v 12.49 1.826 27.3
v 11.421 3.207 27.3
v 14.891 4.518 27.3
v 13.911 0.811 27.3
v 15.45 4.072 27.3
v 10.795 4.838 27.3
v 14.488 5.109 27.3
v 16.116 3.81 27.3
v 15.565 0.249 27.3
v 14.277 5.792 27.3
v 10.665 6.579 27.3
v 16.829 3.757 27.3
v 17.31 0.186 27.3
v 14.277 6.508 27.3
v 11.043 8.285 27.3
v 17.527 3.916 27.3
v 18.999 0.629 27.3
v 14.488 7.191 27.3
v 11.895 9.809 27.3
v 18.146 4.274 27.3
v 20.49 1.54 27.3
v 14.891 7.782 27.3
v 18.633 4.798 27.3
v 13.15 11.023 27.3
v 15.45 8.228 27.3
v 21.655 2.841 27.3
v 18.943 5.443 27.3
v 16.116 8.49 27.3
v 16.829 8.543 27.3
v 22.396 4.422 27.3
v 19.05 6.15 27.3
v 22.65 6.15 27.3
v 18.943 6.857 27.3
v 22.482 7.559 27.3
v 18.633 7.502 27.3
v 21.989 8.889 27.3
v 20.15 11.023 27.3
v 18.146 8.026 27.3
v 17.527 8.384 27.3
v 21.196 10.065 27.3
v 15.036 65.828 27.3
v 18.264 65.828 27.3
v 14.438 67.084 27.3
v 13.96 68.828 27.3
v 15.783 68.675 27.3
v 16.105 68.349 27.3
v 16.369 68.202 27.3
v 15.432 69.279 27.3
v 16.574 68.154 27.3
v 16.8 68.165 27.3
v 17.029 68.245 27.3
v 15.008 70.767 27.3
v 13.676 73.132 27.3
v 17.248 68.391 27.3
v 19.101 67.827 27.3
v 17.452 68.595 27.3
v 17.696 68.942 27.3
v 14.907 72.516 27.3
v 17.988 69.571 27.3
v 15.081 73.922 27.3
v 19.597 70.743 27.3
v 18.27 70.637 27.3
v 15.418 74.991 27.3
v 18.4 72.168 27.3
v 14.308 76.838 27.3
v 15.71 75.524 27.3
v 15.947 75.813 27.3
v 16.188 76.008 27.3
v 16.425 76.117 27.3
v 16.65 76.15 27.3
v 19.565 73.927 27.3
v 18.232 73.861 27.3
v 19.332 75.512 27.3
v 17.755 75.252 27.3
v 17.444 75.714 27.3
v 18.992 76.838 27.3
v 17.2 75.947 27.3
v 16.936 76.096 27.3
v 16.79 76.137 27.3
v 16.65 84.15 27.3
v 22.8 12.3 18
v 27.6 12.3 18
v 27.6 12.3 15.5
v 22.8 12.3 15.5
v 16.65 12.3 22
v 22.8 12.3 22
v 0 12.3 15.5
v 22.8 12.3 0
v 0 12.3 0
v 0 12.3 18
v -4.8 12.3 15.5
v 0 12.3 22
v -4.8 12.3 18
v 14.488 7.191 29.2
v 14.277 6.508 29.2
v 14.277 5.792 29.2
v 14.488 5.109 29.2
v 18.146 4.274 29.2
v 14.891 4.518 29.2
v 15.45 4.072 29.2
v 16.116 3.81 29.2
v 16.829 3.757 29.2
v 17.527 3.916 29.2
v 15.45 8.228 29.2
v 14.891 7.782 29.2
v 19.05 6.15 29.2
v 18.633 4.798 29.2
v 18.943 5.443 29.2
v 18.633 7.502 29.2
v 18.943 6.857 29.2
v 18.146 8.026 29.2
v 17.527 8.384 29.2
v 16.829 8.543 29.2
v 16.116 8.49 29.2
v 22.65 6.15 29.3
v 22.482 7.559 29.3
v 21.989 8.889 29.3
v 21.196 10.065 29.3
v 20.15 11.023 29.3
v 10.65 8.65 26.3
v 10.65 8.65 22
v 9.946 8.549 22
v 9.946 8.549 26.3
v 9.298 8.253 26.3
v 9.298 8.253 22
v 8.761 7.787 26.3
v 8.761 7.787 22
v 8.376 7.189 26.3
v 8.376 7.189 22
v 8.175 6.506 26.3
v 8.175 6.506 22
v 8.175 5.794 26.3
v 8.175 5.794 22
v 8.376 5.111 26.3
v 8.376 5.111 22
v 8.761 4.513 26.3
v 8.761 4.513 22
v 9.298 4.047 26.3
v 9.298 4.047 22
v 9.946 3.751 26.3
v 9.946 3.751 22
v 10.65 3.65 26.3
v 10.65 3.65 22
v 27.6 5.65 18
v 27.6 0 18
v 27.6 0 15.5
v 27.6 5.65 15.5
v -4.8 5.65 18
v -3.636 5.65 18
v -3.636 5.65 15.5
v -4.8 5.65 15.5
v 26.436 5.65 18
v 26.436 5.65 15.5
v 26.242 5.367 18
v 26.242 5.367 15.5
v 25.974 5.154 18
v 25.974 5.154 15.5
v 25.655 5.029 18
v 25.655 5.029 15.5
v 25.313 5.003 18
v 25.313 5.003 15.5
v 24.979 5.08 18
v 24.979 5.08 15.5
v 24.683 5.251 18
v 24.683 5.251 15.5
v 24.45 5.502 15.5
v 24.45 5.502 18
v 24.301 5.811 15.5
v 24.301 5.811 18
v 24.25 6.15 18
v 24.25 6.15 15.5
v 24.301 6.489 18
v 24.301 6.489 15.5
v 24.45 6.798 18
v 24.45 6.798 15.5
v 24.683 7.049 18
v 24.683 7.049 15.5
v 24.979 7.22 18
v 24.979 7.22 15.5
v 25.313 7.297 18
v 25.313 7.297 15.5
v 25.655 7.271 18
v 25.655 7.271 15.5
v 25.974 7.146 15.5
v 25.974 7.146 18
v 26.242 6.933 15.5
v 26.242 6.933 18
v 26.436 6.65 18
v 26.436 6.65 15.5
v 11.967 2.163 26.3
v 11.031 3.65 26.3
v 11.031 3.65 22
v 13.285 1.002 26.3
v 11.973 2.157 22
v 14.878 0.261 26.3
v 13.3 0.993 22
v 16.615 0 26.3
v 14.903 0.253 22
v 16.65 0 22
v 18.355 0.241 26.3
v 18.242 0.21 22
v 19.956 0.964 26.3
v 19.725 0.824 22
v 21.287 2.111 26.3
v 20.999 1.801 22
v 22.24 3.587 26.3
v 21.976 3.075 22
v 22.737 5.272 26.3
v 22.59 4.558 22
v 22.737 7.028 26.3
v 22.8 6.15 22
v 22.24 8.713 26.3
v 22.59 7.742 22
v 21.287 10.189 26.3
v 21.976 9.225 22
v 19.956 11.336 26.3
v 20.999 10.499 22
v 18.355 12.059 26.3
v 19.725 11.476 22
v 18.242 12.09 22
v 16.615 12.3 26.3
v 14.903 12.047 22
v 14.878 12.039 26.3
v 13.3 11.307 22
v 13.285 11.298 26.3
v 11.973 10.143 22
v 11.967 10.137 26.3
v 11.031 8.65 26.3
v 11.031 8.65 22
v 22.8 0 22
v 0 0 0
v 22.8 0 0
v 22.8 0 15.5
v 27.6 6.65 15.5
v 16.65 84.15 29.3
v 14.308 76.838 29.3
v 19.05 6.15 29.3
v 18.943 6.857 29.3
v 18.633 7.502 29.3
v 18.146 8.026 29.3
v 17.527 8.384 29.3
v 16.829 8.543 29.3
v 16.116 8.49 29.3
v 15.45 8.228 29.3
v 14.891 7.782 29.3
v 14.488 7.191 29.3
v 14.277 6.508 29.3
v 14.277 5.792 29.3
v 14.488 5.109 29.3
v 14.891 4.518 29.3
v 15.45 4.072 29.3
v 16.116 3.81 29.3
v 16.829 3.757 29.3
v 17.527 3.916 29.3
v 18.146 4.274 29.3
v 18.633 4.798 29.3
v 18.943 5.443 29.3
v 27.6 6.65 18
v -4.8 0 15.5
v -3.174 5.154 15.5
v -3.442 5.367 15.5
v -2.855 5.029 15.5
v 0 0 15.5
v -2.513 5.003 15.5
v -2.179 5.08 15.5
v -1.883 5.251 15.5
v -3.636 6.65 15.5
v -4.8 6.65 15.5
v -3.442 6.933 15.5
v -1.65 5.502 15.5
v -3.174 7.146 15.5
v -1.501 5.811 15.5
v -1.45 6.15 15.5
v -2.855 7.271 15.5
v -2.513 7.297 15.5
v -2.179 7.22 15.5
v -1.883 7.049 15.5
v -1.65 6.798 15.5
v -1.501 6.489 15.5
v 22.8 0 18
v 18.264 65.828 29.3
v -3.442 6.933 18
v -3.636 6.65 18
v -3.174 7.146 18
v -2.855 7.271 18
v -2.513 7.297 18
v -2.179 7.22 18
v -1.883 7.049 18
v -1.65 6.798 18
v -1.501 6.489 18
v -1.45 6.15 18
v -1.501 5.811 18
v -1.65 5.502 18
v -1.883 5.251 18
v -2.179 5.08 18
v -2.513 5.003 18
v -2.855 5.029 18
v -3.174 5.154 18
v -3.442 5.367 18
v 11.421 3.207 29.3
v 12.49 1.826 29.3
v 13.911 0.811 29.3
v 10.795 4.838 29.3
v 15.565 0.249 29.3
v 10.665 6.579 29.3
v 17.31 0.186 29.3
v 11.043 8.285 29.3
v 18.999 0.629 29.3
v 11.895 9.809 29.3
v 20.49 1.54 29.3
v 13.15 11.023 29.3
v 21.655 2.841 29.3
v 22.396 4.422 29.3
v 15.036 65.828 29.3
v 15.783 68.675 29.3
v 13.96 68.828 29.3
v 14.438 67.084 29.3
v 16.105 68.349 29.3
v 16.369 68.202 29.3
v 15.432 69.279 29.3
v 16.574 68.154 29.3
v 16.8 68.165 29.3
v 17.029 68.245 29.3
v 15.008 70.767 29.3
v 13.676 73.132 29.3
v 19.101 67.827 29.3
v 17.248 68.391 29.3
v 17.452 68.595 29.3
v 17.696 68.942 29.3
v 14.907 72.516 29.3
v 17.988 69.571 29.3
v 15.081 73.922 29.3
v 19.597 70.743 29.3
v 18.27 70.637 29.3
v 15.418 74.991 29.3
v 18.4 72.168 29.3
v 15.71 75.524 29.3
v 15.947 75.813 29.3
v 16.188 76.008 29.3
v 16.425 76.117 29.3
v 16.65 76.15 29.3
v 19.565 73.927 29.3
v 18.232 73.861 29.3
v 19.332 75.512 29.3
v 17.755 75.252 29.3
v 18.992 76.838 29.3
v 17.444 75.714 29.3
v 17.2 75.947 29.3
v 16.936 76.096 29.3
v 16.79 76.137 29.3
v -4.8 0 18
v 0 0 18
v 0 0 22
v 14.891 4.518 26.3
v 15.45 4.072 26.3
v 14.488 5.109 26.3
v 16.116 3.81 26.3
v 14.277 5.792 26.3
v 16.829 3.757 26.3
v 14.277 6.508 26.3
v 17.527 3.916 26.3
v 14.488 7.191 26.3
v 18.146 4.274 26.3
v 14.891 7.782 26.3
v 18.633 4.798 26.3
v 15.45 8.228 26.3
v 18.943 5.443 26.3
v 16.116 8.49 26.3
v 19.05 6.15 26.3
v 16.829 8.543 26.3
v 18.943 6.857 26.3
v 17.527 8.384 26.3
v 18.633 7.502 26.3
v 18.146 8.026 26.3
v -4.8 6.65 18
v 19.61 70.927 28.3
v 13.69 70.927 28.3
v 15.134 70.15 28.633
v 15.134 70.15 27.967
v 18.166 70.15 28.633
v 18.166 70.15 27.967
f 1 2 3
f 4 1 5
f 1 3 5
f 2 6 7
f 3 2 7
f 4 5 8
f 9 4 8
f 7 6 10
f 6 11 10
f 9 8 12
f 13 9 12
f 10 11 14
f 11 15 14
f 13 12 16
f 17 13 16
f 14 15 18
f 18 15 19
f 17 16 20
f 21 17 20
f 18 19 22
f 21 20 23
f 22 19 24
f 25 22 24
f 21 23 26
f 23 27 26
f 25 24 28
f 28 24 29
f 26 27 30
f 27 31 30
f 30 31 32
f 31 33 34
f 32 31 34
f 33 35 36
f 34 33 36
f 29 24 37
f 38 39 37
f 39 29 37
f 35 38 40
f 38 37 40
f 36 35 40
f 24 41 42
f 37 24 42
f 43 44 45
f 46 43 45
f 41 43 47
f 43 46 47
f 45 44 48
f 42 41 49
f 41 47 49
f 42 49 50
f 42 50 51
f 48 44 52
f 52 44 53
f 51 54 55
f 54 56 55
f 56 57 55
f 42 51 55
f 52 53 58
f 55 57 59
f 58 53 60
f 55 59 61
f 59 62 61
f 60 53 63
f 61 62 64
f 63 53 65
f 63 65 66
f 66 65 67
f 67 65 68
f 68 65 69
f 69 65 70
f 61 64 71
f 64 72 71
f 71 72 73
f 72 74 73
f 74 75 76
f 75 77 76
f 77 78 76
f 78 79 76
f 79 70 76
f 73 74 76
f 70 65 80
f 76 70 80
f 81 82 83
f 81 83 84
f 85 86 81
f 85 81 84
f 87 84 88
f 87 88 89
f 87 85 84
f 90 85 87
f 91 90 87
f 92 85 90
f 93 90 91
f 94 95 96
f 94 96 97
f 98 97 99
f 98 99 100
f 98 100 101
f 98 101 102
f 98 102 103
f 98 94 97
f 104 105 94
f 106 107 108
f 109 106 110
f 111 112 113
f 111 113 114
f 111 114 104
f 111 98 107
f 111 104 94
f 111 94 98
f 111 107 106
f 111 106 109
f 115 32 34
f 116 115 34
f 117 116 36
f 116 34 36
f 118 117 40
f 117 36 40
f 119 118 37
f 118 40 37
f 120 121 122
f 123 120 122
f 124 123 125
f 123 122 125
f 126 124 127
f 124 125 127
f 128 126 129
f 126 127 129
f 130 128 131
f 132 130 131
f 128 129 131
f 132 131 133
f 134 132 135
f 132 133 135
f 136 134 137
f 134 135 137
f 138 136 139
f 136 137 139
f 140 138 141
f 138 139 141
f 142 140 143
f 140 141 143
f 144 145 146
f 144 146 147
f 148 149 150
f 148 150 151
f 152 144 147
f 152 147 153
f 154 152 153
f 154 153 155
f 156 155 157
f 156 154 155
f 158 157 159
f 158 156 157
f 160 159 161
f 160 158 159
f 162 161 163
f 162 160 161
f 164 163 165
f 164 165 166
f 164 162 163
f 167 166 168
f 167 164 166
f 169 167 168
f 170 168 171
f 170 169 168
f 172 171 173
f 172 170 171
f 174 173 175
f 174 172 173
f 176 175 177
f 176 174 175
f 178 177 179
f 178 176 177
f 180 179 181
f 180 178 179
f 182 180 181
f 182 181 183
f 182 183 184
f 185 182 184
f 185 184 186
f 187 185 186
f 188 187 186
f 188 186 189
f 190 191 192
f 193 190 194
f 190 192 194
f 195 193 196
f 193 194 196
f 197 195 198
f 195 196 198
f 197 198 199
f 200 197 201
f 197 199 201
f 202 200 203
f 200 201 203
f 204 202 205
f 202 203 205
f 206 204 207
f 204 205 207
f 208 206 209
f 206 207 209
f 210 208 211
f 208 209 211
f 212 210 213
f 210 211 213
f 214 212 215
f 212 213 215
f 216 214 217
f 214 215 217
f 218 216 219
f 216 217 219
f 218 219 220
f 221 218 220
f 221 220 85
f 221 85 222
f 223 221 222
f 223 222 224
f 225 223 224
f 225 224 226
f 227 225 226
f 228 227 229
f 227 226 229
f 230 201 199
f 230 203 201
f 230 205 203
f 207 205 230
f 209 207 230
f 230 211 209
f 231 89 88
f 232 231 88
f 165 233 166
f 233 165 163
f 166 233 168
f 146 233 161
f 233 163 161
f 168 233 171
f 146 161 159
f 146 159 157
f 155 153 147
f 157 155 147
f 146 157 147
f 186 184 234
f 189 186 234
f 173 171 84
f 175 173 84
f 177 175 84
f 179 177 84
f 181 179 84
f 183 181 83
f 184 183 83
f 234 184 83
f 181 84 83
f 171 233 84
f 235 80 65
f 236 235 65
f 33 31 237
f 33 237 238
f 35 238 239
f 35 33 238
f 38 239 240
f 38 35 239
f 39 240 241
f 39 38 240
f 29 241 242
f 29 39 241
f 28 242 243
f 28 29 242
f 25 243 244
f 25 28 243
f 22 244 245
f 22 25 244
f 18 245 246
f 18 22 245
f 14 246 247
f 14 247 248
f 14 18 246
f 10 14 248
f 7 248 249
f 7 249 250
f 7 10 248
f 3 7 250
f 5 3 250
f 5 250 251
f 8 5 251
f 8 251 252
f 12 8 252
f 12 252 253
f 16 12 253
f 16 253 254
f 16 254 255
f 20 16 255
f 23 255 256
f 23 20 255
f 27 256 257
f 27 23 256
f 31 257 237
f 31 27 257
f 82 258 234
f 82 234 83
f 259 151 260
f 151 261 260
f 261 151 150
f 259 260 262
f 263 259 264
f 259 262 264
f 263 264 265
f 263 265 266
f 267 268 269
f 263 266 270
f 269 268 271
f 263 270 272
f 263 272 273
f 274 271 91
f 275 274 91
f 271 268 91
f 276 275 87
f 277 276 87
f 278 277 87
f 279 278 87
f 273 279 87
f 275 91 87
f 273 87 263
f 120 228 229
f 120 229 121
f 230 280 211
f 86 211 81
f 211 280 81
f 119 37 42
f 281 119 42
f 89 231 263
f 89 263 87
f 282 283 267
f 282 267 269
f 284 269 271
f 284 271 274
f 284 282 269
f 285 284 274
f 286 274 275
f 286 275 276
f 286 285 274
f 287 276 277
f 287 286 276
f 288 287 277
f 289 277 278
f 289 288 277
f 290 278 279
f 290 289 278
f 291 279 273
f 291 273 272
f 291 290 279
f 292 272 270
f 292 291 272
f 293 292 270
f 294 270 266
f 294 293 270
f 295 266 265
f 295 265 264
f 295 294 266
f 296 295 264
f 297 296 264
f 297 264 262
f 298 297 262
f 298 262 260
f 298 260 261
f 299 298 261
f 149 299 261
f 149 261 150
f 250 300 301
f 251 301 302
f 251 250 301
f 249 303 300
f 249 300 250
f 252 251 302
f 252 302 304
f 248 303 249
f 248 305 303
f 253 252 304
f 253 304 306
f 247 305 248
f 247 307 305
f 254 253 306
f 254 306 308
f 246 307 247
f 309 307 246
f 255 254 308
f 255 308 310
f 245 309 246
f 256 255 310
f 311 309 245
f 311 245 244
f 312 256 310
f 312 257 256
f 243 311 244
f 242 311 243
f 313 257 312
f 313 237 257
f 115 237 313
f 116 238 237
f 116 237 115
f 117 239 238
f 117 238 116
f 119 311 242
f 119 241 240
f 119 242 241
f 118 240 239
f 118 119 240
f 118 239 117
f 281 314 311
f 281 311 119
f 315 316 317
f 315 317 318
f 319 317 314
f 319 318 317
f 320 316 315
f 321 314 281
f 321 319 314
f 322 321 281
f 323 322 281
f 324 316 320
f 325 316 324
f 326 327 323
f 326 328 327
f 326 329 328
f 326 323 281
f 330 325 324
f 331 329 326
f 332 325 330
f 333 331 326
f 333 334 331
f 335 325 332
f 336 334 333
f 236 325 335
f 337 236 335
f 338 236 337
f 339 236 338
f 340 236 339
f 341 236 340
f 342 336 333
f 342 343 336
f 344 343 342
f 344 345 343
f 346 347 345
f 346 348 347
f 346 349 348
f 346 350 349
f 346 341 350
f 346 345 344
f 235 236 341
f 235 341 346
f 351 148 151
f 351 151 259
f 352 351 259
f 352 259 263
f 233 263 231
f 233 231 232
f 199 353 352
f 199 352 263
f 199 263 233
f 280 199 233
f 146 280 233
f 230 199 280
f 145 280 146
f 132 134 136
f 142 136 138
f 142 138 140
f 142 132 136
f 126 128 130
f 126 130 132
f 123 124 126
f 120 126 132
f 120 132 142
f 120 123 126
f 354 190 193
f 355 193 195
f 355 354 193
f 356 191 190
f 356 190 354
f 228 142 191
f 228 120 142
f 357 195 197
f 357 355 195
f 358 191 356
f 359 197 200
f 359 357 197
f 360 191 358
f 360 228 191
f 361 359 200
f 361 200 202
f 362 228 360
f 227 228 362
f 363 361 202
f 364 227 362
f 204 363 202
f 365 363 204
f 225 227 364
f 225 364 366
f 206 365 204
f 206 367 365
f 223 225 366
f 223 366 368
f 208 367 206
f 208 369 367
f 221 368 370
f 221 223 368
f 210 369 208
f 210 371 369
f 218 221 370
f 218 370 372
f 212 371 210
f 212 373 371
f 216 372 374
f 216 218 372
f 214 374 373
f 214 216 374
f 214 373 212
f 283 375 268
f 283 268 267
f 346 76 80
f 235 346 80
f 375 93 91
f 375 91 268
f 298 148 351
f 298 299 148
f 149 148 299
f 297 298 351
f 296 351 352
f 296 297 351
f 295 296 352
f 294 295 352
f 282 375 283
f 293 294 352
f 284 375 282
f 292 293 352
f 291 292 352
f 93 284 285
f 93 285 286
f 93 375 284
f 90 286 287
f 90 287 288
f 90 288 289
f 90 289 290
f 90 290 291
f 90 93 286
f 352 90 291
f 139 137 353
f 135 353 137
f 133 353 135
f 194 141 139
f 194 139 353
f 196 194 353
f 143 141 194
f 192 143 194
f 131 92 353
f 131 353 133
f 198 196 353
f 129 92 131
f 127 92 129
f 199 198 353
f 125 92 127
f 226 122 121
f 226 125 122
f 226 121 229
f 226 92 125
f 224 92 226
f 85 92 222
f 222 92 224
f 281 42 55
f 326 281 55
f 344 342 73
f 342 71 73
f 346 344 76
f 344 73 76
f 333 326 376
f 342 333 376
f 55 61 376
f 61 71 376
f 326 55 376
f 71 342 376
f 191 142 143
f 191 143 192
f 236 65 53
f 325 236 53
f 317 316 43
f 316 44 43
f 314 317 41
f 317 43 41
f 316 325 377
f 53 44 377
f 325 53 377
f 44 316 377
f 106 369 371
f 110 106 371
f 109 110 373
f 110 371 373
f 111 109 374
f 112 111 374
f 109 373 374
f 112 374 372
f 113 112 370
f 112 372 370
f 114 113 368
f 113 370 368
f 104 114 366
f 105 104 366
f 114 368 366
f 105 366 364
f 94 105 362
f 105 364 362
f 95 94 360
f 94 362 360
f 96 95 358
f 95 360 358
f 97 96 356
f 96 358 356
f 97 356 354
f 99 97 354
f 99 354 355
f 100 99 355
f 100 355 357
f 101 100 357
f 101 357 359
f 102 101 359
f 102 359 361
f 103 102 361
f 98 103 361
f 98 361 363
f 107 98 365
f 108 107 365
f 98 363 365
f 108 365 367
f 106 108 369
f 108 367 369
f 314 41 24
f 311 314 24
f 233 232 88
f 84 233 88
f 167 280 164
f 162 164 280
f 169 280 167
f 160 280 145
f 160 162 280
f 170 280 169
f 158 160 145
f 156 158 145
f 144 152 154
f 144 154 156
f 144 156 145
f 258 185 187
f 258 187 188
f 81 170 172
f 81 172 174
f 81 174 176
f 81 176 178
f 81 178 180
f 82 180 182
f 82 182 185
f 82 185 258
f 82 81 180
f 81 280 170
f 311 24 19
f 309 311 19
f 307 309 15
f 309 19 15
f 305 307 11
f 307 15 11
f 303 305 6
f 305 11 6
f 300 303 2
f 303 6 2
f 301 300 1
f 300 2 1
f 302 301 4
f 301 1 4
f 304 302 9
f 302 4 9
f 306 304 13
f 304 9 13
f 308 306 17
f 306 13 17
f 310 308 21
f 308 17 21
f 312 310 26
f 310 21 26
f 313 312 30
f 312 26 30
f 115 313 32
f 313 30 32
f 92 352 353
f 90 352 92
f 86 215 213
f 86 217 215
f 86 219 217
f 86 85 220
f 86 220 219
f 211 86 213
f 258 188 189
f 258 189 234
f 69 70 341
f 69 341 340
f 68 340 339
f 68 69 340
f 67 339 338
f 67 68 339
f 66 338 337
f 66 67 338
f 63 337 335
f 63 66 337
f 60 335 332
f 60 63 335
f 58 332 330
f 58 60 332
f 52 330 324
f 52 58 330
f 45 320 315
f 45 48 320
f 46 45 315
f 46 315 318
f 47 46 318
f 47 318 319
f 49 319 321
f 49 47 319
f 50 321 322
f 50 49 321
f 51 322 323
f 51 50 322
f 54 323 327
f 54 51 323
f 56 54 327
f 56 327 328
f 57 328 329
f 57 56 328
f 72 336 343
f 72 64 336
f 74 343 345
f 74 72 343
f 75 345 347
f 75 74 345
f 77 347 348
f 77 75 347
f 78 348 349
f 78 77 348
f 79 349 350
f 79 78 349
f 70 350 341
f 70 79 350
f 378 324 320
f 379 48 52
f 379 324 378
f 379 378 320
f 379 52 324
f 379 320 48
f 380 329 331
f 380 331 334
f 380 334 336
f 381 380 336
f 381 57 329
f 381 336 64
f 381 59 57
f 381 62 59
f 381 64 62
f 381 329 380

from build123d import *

# Parameters (mm, degrees)
F0_W      = 22.8
F0_H      = 12.3
F1_DEPTH  = 18
F3_DEPTH  = 2.5
F4_W      = 22.8
F4_H      = 12.3
F5_DEPTH  = 4
F7_DEPTH  = 4.3
F8_R      = 2.4
F9_DEPTH  = 2.9
F11_R     = 2.4
F12_DEPTH = 2


with BuildPart() as f1:
    # F0 (on Top) → F1 (new body)
    with BuildSketch(Plane.XY):
        with Locations((11.4, 6.15)):
            Rectangle(F0_W, F0_H)
    extrude(amount=F1_DEPTH)

    # F2 (on face) → F3 (join)
    with BuildSketch(Plane.XY.offset(18)):
        with BuildLine():
            Line((22.8, 12.3), (0, 12.3))
            Line((0, 12.3), (-4.8, 12.3))
            Line((-4.8, 12.3), (-4.8, 6.65))
            Line((-4.8, 6.65), (-3.6356157589, 6.65))
            ThreePointArc((-3.6356157589, 6.65), (-1.45, 6.15), (-3.6356157589, 5.65))
            Line((-3.6356157589, 5.65), (-4.8, 5.65))
            Line((-4.8, 5.65), (-4.8, 0))
            Line((-4.8, 0), (0, 0))
            Line((0, 0), (22.8, 0))
            Line((22.8, 0), (27.6, 0))
            Line((27.6, 0), (27.6, 5.65))
            Line((27.6, 5.65), (26.4356157589, 5.65))
            ThreePointArc((26.4356157589, 5.65), (24.25, 6.15), (26.4356157589, 6.65))
            Line((26.4356157589, 6.65), (27.6, 6.65))
            Line((27.6, 6.65), (27.6, 12.3))
            Line((27.6, 12.3), (22.8, 12.3))
        make_face()
    extrude(amount=-F3_DEPTH)

    # F4 (on face) → F5 (join)
    with BuildSketch(Plane.XY.offset(18)):
        with Locations((11.4, 6.15)):
            Rectangle(F4_W, F4_H)
    extrude(amount=F5_DEPTH)

    # F6 (on face) → F7 (join)
    with BuildSketch(Plane.XY.offset(22)):
        with BuildLine():
            Line((10.65, 3.65), (11.0310588186, 3.65))
            ThreePointArc((11.0310588186, 3.65), (22.8, 6.15), (11.0310588186, 8.65))
            Line((11.0310588186, 8.65), (10.65, 8.65))
            ThreePointArc((10.65, 8.65), (8.15, 6.15), (10.65, 3.65))
        make_face()
    extrude(amount=F7_DEPTH)

    # F8 (on face) → F9 (join)
    with BuildSketch(Plane.XY.offset(26.3)):
        with Locations((16.65, 6.15)):
            Circle(F8_R)
    extrude(amount=F9_DEPTH)


with BuildPart() as f12:
    # F11 (on offset) → F12 (new body)
    with BuildSketch(Plane.XY.offset(27.3)):
        with BuildLine():
            ThreePointArc((13.15, 11.0233971724), (13.9113872125, 0.811460874), (22.65, 6.15))
            ThreePointArc((22.65, 6.15), (21.988539126, 8.8886127875), (20.15, 11.0233971724))
            ThreePointArc((20.15, 11.0233971724), (16.65, 12.15), (13.15, 11.0233971724))
        make_face()
        with Locations((16.65, 6.15)):
            Circle(F11_R, mode=Mode.SUBTRACT)
        with BuildLine():
            ThreePointArc((13.15, 11.0233971724), (16.65, 12.15), (20.15, 11.0233971724))
            Line((20.15, 11.0233971724), (18.264289308, 65.8283753918))
            add(Edge.make_bspline(
                [(18.264289308, 65.8283753918), (21.0789576918, 70.3205840399), (18.9918742494, 76.8375)],
                knots=[0.5681770814, 0.5681770814, 0.5681770814, 2.2459278597, 2.2459278597, 2.2459278597], degree=2, weights=[1, 0.6682998373, 1]))
            Line((18.9918742494, 76.8375), (16.65, 84.15))
            Line((16.65, 84.15), (14.3081257506, 76.8375))
            add(Edge.make_bspline(
                [(14.3081257506, 76.8375), (12.2210423082, 70.3205840399), (15.035710692, 65.8283753918)],
                knots=[4.0372574474, 4.0372574474, 4.0372574474, 5.7150082258, 5.7150082258, 5.7150082258], degree=2, weights=[1, 0.6682998373, 1]))
            Line((15.035710692, 65.8283753918), (13.15, 11.0233971724))
        make_face()
        with BuildLine():
            add(Edge.make_bspline(
                [(16.65, 76.15), (13.6189110868, 76.15), (15.1344555434, 70.15), (16.65, 64.15), (18.1655444566, 70.15), (19.6810889132, 76.15), (16.65, 76.15)],
                knots=[0, 0, 0, 2.0943951024, 2.0943951024, 4.1887902048, 4.1887902048, 6.2831853072, 6.2831853072, 6.2831853072], degree=2, weights=[1, 0.5, 1, 0.5, 1, 0.5, 1]))
        make_face(mode=Mode.SUBTRACT)
    extrude(amount=F12_DEPTH)


solid = Compound([f1.part, f12.part])
